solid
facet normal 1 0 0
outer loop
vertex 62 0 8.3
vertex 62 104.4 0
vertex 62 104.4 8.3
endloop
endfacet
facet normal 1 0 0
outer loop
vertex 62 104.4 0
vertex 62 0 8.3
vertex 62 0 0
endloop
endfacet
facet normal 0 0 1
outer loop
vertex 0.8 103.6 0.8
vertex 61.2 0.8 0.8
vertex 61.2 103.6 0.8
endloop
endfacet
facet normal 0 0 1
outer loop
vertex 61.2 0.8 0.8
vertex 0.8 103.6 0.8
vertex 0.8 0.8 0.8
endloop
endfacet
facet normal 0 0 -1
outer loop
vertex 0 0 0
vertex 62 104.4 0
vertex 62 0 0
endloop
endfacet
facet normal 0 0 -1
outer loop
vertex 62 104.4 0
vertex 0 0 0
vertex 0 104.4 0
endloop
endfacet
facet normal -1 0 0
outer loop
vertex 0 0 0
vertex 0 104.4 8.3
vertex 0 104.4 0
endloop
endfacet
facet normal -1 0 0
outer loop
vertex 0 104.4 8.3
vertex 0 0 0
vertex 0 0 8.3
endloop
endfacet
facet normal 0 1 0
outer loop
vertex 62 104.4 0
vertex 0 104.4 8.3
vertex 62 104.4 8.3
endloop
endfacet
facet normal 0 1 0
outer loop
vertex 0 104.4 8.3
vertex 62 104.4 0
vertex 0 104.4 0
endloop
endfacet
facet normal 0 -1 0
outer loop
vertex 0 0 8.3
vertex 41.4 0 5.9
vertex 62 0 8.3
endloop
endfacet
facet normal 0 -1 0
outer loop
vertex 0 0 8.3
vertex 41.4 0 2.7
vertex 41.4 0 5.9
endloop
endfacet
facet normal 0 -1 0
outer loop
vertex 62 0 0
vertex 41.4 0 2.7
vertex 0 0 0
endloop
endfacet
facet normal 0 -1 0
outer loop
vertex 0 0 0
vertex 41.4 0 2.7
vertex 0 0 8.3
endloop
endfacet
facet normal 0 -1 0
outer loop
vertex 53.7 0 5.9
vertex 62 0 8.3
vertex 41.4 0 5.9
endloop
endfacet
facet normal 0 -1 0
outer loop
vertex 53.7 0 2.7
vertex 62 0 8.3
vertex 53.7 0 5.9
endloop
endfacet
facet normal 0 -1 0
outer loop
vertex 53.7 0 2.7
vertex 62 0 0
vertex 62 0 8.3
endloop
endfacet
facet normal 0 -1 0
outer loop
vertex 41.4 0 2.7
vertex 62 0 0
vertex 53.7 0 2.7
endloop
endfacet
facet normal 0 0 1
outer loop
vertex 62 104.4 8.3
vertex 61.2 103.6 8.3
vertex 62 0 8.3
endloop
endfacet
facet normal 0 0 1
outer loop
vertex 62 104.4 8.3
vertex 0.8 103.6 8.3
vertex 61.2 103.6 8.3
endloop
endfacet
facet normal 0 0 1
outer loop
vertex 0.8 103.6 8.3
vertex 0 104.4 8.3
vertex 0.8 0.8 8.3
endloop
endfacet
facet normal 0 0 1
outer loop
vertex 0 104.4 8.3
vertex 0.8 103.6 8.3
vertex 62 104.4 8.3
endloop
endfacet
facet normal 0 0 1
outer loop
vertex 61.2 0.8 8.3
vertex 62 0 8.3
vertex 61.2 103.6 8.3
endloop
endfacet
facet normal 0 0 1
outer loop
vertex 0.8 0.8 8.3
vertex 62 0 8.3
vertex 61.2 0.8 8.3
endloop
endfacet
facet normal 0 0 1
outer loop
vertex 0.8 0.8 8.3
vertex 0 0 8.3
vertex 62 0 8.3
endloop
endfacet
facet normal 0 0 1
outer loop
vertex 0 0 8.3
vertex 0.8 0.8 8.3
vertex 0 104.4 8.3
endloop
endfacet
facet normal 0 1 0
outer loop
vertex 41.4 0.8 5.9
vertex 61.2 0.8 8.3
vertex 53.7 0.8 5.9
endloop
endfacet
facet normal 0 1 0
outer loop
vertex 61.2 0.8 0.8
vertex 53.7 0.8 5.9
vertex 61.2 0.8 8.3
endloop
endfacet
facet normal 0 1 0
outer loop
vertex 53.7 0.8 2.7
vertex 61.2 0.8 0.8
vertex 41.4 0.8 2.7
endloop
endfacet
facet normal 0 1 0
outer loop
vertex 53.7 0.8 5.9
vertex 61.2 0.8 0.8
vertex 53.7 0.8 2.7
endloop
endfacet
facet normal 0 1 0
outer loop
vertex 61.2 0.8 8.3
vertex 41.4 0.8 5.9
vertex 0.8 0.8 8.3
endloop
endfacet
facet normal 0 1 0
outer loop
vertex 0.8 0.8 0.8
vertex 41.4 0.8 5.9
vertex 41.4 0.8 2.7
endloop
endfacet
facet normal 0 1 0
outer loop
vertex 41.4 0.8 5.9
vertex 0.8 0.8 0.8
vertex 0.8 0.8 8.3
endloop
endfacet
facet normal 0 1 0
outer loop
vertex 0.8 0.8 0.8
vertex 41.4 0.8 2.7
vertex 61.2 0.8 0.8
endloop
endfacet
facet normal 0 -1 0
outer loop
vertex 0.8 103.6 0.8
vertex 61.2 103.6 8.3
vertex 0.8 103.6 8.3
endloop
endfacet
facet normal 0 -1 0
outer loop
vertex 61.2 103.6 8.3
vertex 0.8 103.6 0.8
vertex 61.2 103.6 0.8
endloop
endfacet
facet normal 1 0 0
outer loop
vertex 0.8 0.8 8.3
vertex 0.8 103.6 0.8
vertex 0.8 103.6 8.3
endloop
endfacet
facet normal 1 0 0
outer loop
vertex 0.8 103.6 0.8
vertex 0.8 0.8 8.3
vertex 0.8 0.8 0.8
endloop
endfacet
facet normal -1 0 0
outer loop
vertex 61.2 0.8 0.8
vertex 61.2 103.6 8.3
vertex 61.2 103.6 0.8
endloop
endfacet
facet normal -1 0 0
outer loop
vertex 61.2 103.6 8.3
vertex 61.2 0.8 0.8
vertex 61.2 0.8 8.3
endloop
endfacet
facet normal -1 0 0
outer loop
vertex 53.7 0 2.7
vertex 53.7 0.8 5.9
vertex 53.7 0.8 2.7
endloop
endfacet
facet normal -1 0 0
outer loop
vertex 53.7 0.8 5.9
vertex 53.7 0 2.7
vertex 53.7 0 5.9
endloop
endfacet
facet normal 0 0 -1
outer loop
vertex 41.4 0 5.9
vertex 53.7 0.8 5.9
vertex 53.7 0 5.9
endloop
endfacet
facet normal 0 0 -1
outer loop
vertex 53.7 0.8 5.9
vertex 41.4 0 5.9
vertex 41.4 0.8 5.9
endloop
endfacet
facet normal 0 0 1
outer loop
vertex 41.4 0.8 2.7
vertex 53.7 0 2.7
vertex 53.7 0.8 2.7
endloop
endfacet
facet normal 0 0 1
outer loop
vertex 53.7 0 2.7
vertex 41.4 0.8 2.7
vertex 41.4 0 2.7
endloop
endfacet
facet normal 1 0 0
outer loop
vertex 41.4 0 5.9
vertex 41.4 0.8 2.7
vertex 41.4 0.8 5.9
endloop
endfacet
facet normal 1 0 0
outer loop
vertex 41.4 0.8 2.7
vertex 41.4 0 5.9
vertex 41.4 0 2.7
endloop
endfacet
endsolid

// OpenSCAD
wall = .8;
width = 62.0;
length = 104.4;
depth = 8.3;

hold_offset = 8.3;
hold_float = 2.7;
hold_width = 12.3;
hold_height = 3.2;

difference() {
    rough_box(wall, width, length, depth);

    color([0,1,0]) translate([width-hold_offset-hold_width, 0, hold_float]) cube([hold_width, wall, hold_height]);
}

module rough_box(wall, width, length, depth) {
    cube([width,length,wall]);

    cube([width,wall,depth]);
    translate([0,length-wall,0]) cube([width,wall,depth]);

    cube([wall,length,depth]);
    translate([width-wall,0,0]) cube([wall,length,depth]);
}
